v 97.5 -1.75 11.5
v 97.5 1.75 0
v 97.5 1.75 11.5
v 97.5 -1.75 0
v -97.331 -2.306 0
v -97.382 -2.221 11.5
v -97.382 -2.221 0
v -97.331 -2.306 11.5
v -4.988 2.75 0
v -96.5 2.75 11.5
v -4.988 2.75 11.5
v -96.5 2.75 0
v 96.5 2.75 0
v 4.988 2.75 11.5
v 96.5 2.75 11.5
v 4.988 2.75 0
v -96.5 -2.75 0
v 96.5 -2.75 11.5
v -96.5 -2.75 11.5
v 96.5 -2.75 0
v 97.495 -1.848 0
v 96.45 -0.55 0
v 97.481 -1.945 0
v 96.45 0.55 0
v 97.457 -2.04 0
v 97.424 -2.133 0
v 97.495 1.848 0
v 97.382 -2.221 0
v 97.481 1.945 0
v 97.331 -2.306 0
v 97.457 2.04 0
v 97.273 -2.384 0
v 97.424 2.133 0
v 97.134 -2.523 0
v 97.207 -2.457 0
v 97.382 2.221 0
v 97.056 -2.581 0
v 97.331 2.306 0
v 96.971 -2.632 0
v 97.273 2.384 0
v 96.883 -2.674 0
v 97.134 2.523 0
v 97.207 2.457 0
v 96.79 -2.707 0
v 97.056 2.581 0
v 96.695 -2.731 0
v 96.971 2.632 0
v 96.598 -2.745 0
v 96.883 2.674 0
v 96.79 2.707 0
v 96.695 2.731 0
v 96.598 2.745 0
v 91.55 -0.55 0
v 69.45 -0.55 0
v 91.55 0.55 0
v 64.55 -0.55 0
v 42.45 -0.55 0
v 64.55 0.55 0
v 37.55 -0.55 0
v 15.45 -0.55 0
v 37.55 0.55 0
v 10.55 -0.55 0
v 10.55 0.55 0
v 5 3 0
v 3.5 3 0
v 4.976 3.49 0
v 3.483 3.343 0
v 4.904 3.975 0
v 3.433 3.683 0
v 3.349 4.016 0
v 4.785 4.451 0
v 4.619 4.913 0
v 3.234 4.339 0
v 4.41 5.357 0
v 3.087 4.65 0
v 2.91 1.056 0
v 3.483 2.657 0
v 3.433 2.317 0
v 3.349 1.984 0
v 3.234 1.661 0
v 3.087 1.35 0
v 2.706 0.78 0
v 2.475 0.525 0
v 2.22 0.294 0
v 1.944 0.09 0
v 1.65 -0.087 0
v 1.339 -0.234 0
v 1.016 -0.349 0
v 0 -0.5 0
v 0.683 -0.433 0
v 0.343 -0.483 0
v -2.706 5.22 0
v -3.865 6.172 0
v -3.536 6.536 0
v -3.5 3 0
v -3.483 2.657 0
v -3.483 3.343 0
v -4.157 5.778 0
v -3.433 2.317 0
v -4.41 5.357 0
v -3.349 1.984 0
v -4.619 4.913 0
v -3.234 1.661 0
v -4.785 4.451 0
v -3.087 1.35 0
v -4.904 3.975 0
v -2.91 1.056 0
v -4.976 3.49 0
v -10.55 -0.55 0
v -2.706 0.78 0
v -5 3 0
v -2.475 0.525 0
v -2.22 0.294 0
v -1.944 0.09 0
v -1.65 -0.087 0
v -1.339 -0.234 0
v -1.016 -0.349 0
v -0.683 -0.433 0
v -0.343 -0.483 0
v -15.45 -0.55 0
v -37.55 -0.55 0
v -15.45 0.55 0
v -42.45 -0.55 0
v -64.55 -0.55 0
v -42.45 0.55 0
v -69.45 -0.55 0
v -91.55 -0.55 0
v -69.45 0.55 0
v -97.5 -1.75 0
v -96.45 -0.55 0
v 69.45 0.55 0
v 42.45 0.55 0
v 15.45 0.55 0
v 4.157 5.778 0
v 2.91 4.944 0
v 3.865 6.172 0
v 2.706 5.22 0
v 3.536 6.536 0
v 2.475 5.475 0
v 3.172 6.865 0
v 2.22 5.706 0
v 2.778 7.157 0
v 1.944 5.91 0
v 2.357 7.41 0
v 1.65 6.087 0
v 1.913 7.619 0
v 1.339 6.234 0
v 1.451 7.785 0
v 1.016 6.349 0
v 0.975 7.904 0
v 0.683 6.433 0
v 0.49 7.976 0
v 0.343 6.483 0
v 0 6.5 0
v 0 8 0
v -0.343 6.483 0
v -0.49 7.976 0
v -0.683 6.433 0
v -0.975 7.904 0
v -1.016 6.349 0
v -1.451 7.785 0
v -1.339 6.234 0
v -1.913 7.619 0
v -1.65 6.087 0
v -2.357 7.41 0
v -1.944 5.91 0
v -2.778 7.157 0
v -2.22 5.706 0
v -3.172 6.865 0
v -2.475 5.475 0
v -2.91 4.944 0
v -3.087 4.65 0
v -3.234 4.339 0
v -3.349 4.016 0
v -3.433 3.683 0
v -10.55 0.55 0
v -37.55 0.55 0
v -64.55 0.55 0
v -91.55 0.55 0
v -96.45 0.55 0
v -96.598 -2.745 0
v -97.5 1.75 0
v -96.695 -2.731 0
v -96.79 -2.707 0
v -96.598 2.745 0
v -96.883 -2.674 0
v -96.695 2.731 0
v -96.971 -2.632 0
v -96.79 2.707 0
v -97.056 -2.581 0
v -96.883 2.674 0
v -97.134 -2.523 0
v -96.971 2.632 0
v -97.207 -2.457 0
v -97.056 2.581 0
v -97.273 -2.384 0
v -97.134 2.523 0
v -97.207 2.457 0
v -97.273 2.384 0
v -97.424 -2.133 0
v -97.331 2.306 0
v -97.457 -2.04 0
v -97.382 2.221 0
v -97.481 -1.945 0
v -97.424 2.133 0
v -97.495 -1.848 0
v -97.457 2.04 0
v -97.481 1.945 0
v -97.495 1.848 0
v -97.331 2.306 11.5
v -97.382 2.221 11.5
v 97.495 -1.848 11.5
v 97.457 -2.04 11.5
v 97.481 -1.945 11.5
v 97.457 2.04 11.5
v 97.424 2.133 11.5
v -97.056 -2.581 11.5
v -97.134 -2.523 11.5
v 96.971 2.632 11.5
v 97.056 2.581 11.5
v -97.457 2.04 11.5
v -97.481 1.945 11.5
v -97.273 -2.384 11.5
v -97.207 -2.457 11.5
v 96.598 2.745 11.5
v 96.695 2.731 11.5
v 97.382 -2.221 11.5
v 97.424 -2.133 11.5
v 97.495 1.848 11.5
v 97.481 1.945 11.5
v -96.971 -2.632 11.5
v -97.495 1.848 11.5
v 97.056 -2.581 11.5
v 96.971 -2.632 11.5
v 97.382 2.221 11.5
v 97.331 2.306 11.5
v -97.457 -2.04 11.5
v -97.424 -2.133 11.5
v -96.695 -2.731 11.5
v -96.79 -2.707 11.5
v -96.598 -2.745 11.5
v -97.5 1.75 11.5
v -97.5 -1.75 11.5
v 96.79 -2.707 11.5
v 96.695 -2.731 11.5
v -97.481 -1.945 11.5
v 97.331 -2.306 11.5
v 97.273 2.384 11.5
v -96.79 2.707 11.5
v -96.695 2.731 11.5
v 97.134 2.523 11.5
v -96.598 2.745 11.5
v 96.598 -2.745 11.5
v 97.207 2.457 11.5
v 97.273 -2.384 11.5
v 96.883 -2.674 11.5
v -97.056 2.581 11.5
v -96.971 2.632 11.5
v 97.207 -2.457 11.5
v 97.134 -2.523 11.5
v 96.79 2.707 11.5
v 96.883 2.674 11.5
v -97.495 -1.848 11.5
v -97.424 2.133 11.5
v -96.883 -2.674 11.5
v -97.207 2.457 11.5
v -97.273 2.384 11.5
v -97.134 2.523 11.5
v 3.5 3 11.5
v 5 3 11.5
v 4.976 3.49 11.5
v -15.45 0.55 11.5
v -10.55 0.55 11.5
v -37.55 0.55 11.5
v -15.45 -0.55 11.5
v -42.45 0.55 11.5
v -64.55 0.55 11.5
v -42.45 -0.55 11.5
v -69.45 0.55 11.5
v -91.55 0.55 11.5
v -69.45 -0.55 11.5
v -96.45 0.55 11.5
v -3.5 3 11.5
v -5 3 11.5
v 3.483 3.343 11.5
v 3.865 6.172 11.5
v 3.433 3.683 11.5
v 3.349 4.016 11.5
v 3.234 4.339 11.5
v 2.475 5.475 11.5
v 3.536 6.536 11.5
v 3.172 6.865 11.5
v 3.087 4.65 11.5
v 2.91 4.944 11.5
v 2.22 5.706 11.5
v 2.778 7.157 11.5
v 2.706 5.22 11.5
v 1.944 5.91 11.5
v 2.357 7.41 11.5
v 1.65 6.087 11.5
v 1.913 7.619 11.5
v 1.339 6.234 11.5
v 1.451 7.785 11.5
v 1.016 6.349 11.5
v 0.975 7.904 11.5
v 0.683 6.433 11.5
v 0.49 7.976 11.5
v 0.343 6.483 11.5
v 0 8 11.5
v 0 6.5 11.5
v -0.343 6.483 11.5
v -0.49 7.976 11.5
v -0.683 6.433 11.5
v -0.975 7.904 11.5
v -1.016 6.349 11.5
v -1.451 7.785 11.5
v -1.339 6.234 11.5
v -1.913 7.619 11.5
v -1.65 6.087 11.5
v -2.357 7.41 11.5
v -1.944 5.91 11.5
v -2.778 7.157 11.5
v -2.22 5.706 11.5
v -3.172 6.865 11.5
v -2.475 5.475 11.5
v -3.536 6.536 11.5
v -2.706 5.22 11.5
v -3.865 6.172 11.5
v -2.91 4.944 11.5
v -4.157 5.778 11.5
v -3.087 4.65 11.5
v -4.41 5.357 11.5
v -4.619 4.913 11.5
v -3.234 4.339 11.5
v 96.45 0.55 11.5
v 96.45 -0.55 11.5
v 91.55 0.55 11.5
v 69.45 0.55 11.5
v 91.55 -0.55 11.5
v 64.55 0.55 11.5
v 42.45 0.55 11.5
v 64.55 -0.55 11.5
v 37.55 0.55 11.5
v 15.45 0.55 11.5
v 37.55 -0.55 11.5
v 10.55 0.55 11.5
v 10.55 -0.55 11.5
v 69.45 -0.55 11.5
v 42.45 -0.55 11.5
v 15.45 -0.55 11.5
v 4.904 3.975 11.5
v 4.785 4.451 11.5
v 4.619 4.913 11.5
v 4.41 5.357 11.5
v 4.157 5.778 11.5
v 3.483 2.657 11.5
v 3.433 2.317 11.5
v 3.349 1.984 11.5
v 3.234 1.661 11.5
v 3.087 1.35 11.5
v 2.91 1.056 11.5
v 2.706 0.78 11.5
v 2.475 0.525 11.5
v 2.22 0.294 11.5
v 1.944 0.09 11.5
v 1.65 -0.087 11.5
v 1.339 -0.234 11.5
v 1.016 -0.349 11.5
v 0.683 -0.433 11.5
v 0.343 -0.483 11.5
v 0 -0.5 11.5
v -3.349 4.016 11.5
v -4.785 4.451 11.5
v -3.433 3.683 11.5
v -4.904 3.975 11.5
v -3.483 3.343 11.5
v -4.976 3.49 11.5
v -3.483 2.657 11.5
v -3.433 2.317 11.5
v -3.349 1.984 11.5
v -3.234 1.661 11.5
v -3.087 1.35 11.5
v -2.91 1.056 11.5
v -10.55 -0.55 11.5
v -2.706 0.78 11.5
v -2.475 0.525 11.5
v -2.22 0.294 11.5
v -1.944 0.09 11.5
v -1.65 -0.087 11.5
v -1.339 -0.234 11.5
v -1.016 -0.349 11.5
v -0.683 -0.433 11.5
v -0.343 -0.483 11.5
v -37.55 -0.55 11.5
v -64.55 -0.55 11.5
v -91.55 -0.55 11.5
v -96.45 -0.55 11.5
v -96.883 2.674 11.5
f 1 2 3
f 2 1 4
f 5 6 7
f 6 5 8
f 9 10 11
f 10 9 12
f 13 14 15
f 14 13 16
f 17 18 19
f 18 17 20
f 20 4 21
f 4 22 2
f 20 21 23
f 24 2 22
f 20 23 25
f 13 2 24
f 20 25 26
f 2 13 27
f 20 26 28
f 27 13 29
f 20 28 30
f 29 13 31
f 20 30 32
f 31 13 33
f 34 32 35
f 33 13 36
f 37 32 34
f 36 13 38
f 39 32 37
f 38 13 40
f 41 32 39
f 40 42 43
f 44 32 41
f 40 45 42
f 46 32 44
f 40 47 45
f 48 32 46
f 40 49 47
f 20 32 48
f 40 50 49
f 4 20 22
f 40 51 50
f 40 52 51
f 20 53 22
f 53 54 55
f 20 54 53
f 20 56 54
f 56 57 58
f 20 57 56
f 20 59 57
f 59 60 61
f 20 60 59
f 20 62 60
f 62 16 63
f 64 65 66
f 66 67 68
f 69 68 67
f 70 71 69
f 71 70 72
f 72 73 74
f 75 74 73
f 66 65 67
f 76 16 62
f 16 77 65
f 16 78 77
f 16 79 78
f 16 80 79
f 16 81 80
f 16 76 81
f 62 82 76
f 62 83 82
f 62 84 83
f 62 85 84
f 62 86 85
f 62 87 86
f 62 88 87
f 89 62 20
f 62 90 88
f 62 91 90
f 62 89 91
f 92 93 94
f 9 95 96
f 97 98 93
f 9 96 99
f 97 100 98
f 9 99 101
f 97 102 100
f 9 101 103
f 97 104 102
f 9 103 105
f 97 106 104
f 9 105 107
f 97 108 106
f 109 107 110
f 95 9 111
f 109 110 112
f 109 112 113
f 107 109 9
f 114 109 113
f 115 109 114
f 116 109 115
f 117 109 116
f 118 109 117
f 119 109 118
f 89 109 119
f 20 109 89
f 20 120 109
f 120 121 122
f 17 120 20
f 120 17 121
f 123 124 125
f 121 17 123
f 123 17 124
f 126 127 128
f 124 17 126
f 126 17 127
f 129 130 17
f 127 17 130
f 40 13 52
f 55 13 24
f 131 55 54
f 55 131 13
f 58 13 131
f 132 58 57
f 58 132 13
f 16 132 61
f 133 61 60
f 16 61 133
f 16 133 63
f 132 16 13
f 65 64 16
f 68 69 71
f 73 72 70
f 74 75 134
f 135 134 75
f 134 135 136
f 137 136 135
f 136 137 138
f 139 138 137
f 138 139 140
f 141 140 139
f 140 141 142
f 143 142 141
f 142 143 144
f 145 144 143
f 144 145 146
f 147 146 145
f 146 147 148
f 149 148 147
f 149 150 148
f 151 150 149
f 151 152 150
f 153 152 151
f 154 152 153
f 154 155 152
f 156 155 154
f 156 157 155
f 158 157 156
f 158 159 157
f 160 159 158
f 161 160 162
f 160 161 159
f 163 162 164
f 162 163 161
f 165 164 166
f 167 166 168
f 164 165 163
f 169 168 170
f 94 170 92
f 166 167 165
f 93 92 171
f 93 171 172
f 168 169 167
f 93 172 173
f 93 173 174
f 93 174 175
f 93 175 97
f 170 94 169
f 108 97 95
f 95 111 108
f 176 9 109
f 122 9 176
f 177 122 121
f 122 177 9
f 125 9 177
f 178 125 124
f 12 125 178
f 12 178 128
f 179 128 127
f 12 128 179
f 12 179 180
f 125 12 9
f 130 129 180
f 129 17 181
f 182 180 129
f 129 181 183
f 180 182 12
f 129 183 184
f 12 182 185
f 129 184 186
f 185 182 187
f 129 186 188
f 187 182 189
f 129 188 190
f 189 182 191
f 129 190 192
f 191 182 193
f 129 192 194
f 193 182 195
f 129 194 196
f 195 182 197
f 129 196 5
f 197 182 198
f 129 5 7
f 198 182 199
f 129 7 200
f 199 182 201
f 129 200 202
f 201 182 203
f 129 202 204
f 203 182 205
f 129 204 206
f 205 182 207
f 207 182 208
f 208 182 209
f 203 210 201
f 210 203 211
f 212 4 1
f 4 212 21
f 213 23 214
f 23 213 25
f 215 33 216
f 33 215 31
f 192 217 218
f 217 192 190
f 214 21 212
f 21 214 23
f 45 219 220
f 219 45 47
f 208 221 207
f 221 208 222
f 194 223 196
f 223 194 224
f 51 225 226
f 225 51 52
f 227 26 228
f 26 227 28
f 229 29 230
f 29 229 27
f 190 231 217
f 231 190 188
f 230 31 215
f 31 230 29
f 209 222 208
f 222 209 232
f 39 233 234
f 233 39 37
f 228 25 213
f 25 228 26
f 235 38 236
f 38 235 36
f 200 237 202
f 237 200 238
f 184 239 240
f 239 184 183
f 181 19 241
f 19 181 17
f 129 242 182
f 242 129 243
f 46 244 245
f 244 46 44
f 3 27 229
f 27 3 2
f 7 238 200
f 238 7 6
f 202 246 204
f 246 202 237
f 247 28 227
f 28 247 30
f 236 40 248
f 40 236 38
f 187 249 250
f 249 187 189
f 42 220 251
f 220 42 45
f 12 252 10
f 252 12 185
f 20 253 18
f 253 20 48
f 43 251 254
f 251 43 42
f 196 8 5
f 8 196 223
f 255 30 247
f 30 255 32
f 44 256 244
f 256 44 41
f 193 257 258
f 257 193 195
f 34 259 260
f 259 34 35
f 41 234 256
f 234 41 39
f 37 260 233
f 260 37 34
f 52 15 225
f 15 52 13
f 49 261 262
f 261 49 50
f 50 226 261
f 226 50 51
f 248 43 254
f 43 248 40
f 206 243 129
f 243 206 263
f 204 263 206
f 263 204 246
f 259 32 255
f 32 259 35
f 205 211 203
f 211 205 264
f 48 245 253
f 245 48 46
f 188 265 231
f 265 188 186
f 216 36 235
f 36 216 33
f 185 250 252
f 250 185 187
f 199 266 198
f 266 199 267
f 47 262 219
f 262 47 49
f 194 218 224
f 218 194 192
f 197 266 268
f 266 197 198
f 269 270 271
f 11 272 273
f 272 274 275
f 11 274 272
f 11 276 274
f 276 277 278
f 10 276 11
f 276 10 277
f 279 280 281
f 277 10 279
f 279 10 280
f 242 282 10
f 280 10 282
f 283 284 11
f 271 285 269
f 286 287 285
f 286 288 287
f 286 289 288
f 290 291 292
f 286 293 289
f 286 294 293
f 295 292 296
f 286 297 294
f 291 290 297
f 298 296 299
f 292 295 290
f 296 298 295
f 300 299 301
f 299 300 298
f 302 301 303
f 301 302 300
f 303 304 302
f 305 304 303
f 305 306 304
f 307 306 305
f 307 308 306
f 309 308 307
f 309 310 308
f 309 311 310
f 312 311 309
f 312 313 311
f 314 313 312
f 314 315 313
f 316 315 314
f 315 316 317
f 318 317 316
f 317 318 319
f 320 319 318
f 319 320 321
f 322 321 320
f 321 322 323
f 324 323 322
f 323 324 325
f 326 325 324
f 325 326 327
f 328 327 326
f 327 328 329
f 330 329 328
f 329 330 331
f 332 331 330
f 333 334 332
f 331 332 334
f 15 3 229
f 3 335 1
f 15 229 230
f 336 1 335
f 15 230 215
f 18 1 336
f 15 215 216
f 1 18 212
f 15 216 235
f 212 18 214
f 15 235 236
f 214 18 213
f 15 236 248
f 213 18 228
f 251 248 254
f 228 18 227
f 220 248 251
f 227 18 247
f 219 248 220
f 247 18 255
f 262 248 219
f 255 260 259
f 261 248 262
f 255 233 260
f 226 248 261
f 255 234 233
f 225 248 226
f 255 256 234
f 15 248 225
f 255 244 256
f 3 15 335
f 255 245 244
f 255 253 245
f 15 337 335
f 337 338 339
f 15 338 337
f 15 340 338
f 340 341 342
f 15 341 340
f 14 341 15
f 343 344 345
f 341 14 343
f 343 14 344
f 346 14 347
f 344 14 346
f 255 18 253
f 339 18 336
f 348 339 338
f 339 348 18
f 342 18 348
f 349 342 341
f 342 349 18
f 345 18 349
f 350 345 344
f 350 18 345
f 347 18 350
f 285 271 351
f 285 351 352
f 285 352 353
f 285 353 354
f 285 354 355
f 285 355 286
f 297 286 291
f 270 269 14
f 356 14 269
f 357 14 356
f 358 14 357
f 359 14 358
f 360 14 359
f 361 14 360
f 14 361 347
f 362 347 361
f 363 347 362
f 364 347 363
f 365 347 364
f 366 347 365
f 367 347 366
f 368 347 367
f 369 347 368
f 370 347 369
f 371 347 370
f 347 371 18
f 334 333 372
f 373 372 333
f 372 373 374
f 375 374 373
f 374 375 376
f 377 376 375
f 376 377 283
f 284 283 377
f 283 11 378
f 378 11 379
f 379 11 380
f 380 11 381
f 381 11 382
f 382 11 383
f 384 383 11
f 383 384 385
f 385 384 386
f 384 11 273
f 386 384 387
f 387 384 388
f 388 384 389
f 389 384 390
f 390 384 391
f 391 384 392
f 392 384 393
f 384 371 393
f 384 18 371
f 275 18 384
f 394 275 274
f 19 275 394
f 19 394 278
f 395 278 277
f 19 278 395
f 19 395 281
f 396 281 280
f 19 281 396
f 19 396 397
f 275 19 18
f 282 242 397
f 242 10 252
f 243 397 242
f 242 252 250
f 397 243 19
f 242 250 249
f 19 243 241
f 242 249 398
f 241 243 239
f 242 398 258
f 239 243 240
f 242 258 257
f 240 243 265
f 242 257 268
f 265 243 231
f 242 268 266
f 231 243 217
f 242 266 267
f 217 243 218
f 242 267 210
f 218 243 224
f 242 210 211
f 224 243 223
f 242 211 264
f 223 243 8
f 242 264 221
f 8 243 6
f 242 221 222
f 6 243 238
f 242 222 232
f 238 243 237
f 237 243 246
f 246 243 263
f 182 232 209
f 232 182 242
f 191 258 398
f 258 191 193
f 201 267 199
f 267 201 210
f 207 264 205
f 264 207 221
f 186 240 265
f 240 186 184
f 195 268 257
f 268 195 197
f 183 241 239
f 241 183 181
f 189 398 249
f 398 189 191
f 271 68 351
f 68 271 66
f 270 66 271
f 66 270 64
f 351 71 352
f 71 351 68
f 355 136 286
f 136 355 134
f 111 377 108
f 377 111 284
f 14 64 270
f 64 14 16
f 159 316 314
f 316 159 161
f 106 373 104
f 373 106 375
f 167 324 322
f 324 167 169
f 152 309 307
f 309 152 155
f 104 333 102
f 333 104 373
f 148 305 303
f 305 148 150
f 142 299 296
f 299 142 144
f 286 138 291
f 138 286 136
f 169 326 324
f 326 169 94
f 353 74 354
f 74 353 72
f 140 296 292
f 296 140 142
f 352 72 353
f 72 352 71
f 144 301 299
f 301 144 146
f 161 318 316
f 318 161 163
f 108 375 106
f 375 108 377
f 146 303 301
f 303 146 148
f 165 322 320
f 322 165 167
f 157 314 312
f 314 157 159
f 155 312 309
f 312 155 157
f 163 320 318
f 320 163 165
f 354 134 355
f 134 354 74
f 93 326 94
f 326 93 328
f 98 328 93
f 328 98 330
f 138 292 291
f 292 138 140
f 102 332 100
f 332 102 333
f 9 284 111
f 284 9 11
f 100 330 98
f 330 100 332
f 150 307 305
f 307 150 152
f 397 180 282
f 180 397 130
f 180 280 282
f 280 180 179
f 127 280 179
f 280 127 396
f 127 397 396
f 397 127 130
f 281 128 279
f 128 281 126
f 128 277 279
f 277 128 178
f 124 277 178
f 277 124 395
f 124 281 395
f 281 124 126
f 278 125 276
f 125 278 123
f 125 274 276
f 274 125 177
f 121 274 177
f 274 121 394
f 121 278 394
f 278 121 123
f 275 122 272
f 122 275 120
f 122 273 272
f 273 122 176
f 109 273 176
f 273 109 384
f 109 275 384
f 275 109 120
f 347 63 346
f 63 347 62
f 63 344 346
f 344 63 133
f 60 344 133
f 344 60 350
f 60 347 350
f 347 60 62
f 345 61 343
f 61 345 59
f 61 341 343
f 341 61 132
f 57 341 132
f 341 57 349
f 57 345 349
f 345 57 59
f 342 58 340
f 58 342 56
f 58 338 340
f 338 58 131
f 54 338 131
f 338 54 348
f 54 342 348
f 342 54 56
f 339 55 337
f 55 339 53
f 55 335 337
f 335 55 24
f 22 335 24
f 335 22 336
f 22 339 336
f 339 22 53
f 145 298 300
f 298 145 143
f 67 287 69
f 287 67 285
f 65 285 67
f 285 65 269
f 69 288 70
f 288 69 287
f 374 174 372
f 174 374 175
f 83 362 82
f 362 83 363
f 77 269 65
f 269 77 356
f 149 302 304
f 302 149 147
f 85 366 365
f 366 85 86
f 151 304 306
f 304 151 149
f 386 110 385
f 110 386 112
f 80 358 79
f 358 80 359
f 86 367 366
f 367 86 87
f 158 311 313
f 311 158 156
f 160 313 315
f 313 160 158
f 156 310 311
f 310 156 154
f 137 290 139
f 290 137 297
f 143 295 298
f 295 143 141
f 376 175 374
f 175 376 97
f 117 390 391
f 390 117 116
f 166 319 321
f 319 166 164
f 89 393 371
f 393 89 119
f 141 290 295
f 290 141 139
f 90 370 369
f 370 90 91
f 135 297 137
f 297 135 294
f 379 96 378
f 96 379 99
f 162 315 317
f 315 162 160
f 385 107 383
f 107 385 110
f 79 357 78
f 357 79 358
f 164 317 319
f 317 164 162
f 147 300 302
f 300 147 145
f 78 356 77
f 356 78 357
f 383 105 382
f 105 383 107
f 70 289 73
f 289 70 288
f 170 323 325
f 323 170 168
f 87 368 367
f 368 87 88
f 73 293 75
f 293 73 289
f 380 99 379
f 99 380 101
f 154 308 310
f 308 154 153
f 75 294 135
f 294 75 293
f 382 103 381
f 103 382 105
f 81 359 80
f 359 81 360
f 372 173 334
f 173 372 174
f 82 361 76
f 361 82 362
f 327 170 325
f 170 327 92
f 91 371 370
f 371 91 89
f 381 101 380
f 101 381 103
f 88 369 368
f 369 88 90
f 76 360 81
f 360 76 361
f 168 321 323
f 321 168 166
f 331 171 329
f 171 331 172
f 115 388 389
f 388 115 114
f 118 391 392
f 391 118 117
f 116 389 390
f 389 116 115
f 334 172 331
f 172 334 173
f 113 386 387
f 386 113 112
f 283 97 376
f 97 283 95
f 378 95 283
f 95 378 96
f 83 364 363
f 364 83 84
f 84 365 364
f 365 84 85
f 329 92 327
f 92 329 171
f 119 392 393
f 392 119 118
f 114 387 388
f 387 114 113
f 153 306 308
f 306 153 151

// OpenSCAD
// Busy board enclosure - v2 LED carrier bar for D1-D8 (H2); print two, the second turned half a turn is D15-D22 (H7)
// Render this file to generate busy_board_led_bar_long.stl. Print in PETG, flat
// on the bed as modelled, no supports.

include <_busy_board_enclosure.scad>

board_v3 = false;     // v2.0 board, 222 mm square
busy_board_led_bar_long();
